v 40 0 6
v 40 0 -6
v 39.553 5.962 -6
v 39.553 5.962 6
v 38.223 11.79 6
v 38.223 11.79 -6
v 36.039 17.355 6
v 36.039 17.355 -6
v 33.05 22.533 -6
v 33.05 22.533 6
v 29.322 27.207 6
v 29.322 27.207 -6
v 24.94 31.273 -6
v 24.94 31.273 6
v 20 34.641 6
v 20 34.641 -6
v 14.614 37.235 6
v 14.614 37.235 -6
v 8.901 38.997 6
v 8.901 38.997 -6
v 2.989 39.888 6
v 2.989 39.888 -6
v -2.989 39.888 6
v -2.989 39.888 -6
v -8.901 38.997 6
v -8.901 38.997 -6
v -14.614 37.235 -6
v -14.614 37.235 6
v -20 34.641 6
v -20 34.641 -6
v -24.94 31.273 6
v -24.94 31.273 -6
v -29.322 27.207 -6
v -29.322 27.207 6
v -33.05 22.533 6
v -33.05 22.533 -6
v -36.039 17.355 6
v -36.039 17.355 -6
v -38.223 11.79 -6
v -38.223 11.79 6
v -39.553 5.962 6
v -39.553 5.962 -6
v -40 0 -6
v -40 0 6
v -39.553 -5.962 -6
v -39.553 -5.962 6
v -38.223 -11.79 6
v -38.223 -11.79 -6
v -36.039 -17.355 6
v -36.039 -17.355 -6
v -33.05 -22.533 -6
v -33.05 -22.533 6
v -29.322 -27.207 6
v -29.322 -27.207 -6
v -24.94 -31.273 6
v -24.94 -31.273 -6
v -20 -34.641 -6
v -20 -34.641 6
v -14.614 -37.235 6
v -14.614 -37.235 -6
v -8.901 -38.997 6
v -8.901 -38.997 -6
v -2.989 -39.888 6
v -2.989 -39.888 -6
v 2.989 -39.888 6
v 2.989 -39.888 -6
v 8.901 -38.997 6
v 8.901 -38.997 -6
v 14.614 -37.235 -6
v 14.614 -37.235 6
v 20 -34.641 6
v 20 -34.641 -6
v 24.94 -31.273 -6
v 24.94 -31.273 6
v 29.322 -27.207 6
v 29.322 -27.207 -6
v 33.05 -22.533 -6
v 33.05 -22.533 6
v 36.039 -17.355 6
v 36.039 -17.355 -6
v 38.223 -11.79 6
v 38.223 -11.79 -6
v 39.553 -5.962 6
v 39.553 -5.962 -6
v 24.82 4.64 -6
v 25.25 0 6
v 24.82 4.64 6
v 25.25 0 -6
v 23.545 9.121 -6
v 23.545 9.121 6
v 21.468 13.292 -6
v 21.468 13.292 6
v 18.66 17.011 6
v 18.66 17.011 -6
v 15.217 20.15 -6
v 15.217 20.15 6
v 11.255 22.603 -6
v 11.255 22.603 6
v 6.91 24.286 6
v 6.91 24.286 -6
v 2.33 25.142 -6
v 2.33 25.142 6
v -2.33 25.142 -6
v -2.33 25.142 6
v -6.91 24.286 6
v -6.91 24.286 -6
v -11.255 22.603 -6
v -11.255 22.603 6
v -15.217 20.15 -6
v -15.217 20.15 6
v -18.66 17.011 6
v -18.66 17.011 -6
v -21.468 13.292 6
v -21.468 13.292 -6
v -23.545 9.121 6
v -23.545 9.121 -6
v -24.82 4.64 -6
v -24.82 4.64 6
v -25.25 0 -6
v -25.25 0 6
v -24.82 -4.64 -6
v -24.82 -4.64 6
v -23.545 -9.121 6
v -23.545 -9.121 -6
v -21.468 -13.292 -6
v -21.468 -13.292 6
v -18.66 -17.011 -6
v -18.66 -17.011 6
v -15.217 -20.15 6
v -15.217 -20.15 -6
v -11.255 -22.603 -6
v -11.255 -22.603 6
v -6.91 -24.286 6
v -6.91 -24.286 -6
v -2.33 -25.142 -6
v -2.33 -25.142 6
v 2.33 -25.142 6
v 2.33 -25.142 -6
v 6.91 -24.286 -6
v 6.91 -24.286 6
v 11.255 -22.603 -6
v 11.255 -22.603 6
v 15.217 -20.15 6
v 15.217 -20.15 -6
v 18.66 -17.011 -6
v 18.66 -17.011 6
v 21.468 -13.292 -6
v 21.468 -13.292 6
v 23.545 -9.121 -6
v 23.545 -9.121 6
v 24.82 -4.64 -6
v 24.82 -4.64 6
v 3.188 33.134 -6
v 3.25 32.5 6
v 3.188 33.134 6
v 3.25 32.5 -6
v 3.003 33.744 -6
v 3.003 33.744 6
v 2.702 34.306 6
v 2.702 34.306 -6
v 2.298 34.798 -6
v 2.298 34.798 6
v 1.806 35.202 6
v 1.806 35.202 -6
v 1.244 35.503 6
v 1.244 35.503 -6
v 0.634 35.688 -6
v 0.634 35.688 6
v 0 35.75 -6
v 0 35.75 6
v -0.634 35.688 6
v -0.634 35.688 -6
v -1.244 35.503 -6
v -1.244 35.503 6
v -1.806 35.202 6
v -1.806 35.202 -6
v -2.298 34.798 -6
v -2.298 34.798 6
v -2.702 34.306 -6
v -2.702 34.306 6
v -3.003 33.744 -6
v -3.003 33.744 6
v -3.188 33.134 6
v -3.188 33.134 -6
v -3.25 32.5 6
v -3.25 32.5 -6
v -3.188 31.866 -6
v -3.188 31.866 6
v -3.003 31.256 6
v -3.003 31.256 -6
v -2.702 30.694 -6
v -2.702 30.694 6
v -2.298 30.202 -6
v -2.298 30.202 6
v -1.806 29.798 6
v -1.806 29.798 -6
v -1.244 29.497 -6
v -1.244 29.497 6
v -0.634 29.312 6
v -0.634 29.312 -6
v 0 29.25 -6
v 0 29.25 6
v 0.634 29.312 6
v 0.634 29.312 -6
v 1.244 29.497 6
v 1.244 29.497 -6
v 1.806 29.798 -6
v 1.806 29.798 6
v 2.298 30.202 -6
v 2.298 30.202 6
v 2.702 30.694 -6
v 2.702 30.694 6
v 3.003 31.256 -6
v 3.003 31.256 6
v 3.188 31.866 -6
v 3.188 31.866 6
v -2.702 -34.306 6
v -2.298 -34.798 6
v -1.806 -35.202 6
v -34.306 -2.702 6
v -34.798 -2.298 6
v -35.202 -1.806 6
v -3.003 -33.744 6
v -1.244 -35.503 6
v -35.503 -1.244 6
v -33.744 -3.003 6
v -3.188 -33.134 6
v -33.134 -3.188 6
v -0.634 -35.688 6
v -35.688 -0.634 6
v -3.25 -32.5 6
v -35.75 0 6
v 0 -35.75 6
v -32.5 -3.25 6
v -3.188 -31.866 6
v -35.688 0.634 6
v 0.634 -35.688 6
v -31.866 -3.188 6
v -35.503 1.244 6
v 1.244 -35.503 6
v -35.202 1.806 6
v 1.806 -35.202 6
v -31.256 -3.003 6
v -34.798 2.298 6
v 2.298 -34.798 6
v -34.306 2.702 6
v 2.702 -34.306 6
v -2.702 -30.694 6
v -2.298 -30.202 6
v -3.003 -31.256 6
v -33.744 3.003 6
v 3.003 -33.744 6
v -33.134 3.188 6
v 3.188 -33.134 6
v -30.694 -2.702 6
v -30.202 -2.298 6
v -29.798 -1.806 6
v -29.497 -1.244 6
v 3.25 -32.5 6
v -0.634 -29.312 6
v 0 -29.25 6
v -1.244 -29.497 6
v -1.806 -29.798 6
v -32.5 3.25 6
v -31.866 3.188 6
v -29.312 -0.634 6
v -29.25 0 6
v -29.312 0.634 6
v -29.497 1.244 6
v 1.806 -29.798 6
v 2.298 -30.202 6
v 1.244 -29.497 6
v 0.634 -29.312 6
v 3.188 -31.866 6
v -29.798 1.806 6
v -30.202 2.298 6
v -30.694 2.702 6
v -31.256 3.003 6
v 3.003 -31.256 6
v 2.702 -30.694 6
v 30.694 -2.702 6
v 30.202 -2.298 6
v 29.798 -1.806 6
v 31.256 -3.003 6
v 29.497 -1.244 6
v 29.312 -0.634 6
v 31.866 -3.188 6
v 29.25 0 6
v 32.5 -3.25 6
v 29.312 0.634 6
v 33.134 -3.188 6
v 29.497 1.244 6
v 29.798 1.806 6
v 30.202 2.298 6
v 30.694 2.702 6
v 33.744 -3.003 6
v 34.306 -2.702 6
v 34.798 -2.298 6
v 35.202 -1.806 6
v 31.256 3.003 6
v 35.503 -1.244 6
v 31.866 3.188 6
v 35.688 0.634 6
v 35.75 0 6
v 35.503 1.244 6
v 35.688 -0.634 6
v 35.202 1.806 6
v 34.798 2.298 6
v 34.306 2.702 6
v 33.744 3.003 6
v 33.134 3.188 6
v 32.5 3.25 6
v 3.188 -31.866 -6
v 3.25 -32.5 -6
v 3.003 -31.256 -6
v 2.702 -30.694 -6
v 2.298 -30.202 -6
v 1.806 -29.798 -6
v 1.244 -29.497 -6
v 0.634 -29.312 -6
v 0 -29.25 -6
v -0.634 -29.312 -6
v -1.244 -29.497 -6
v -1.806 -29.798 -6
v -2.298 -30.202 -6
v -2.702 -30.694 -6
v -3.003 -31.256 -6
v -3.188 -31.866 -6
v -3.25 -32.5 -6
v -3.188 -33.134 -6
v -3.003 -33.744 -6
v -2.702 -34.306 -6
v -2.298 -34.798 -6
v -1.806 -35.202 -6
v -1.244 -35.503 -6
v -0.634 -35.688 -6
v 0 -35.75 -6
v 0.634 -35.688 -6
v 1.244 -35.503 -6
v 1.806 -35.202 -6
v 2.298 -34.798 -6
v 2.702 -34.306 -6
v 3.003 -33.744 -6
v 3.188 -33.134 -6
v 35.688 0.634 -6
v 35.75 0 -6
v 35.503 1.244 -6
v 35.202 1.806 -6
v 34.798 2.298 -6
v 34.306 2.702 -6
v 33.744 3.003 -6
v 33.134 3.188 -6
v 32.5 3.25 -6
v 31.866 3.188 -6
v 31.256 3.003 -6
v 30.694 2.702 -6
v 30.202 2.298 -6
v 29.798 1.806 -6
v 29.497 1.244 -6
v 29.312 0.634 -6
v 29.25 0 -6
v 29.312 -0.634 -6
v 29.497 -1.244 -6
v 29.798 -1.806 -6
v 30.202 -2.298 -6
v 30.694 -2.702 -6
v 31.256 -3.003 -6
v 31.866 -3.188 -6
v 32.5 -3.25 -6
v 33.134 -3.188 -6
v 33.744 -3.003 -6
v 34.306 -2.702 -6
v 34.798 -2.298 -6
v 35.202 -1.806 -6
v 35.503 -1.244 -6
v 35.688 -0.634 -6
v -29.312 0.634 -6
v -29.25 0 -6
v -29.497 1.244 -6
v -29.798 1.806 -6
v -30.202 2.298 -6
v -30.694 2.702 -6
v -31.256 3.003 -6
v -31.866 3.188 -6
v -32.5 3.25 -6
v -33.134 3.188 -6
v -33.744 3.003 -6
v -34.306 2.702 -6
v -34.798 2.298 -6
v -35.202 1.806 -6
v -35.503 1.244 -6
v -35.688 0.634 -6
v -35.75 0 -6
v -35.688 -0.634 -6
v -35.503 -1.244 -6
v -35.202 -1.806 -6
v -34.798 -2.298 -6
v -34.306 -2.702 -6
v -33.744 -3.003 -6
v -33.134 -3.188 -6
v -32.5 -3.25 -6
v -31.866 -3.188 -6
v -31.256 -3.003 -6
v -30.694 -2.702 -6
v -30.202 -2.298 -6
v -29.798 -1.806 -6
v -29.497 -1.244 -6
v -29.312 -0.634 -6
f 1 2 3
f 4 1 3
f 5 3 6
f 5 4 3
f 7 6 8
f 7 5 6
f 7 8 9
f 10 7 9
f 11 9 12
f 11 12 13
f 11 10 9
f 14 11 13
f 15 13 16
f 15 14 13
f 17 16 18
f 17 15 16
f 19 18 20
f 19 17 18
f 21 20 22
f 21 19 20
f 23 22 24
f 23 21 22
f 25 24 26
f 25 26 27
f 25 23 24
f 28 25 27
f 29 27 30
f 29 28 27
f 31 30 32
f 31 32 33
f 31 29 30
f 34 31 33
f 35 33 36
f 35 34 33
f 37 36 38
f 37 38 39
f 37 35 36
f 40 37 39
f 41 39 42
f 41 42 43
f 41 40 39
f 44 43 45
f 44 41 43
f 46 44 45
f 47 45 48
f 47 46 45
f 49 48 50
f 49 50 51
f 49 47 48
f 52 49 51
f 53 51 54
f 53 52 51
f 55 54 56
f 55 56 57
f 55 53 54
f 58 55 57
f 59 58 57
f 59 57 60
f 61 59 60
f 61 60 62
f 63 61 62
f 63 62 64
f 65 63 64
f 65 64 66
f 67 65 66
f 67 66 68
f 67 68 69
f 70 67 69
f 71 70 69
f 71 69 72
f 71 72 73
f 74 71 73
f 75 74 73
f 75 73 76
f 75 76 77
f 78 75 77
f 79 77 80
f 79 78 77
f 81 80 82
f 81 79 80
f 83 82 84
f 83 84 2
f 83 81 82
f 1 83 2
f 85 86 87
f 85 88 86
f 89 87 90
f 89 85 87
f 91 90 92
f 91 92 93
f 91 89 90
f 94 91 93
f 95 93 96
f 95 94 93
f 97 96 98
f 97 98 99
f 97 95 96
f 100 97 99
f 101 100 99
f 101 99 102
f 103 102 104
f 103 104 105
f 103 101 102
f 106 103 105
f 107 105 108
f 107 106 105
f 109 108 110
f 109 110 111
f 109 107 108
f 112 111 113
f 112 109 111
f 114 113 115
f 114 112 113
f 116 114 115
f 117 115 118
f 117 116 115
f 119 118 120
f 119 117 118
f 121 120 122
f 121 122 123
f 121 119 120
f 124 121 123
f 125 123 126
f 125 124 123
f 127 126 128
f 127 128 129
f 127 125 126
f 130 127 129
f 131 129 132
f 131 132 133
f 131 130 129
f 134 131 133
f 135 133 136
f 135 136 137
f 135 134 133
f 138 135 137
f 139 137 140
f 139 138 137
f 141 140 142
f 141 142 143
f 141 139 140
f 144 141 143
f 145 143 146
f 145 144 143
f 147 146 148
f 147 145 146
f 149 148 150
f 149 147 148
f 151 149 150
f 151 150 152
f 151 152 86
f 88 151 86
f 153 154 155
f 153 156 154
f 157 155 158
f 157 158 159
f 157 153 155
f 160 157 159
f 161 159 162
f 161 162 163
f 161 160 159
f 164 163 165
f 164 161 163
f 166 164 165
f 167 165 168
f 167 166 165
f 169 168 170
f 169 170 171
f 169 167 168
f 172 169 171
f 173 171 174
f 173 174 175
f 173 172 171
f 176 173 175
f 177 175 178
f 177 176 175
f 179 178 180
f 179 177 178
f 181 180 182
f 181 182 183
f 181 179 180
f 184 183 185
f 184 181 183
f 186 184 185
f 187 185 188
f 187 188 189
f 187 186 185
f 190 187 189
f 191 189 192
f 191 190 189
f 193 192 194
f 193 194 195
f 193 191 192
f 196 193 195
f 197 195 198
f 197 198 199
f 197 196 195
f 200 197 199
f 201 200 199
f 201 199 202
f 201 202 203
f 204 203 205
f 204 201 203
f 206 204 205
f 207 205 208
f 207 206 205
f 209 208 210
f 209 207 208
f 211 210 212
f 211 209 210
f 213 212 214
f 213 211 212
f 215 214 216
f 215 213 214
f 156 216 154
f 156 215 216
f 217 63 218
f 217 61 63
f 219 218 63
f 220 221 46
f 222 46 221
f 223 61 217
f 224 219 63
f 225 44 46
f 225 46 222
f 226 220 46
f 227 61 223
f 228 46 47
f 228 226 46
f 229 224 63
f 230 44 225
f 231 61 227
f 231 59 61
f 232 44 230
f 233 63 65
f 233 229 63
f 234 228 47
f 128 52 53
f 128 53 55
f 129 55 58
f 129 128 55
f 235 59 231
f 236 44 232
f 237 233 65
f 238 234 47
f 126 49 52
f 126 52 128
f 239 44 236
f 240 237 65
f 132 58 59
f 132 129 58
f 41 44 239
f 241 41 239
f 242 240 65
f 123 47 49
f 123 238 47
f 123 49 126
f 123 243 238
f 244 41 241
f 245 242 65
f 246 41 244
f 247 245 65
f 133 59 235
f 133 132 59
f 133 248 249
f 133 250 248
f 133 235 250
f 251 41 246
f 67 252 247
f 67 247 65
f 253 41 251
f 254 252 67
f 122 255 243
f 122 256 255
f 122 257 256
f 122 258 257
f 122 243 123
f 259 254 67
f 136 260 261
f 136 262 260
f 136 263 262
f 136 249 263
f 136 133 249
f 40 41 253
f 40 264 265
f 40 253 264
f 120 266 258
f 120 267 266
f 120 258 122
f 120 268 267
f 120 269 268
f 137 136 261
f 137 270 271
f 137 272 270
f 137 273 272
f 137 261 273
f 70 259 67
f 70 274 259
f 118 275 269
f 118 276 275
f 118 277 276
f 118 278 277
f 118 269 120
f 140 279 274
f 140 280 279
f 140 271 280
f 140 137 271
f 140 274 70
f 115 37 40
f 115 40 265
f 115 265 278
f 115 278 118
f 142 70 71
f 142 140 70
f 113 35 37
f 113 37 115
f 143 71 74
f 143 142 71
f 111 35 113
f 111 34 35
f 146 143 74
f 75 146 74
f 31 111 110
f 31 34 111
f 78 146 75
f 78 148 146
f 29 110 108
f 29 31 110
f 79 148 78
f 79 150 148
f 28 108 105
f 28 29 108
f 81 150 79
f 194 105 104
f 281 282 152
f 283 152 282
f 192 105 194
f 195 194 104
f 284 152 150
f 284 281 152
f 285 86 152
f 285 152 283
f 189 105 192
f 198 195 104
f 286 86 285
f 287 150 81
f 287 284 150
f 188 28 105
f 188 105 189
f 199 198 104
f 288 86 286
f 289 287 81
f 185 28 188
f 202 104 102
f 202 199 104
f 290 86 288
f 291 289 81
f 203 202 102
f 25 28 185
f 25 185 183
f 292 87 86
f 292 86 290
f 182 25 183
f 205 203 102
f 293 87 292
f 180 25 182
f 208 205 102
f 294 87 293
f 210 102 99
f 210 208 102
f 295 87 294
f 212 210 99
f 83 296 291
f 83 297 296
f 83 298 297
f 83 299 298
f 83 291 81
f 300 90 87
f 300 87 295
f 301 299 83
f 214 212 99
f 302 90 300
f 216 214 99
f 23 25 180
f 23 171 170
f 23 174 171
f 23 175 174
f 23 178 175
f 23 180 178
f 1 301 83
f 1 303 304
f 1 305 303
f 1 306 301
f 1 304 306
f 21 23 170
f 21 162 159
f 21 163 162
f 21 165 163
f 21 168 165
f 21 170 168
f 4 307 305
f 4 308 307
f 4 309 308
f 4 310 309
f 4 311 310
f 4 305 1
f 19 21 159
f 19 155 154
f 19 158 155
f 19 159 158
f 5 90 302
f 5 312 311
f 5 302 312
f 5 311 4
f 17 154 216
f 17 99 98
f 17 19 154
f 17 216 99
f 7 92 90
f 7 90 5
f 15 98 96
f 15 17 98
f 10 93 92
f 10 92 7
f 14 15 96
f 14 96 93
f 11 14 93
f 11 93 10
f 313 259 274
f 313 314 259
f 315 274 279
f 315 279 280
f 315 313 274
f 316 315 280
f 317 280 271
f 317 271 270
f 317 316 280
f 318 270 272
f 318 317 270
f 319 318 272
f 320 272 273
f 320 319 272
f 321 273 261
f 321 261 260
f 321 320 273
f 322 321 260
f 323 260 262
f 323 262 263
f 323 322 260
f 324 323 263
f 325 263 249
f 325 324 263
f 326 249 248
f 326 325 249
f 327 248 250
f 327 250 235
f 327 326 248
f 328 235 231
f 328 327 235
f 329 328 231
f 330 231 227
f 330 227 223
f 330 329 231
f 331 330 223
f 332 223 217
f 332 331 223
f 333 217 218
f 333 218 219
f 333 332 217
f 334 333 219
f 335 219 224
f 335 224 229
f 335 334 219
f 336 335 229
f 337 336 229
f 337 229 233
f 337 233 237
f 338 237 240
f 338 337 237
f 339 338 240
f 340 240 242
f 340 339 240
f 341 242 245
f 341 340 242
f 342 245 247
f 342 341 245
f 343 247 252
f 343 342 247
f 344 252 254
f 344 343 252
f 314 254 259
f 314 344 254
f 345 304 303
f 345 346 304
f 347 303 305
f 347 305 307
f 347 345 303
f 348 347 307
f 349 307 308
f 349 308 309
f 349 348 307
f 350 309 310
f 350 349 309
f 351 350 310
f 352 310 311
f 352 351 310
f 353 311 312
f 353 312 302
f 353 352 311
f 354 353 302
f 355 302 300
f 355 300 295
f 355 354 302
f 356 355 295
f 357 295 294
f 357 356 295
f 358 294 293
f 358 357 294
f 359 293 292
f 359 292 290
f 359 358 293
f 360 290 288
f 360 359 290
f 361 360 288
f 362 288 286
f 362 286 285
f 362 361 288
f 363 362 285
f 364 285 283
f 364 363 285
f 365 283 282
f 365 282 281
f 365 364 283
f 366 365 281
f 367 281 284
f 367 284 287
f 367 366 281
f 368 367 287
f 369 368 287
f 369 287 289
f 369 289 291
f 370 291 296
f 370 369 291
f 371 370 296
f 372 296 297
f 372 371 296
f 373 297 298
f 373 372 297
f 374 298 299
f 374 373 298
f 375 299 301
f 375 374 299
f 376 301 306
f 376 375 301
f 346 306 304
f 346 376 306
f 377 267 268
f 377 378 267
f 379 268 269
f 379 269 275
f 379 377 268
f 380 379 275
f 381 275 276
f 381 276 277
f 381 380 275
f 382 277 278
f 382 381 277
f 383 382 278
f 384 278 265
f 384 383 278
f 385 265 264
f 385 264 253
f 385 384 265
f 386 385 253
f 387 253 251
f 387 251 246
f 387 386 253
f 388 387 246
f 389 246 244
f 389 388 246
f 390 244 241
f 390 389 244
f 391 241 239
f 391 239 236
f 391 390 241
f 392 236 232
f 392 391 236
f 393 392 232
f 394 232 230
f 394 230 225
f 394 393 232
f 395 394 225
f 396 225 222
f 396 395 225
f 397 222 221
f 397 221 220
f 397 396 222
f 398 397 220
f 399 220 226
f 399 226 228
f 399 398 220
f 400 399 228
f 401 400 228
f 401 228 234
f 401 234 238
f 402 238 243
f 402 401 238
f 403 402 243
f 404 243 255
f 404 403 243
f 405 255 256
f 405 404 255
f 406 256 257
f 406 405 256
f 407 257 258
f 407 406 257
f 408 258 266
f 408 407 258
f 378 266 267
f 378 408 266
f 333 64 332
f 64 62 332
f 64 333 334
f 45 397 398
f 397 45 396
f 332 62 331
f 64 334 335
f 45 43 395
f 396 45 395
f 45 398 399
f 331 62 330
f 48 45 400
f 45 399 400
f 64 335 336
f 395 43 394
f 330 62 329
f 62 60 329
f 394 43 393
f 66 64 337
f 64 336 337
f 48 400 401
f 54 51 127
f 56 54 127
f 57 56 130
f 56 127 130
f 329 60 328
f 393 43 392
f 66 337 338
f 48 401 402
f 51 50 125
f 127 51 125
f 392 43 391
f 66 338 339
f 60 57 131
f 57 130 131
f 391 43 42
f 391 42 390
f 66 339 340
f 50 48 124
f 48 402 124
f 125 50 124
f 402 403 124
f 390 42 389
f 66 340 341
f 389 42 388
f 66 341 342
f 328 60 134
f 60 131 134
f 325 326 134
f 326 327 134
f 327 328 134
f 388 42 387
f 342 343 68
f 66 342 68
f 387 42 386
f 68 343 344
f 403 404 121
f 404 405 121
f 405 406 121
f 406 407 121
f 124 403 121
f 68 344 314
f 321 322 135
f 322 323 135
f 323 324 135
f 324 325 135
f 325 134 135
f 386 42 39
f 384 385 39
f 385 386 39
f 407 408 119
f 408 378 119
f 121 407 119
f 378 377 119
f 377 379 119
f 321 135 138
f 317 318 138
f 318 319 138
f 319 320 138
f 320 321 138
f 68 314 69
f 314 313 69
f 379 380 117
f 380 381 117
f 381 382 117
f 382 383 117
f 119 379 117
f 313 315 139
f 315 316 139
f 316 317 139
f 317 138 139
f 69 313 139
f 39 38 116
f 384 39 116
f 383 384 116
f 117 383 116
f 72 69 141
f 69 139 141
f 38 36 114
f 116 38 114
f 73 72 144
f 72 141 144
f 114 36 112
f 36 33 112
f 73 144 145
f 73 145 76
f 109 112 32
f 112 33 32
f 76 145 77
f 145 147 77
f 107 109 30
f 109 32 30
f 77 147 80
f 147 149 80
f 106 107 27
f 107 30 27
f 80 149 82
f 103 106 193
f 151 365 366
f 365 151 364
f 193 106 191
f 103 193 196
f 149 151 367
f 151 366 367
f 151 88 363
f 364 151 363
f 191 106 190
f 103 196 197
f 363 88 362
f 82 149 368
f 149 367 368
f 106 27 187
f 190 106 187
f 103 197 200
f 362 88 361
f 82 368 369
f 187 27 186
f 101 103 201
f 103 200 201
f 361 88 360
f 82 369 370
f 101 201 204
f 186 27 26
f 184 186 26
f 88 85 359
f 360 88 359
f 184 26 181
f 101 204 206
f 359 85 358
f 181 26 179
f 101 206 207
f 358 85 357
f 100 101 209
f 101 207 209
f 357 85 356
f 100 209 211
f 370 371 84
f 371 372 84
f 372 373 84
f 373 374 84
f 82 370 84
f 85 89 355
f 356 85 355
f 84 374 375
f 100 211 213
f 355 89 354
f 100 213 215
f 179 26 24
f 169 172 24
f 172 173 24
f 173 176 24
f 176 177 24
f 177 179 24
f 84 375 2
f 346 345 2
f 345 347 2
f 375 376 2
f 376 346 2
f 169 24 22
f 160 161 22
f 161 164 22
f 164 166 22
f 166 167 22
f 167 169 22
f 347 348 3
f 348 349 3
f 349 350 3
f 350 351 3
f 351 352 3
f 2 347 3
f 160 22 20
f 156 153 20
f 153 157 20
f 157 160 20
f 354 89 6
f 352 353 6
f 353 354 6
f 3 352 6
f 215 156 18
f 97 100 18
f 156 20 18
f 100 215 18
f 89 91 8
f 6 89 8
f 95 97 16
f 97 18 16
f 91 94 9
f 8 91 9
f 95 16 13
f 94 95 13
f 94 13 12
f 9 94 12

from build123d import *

# Parameters (mm, degrees)
SKETCH1_R           = 40
SKETCH1_R_2         = 25.25
SKETCH1_R_3         = 3.25
BOSS_EXTRUDE1_DEPTH = 6


with BuildPart() as part:
    # Sketch1 → Boss-Extrude1 (new body, symmetric)
    with BuildSketch(Plane.XY):
        Circle(SKETCH1_R)
        Circle(SKETCH1_R_2, mode=Mode.SUBTRACT)
        with Locations((-32.5, 0)):
            Circle(SKETCH1_R_3, mode=Mode.SUBTRACT)
        with Locations((0, 32.5)):
            Circle(SKETCH1_R_3, mode=Mode.SUBTRACT)
        with Locations((0, -32.5)):
            Circle(SKETCH1_R_3, mode=Mode.SUBTRACT)
        with Locations((32.5, 0)):
            Circle(SKETCH1_R_3, mode=Mode.SUBTRACT)
    extrude(amount=BOSS_EXTRUDE1_DEPTH, both=True)


solid = part.part
